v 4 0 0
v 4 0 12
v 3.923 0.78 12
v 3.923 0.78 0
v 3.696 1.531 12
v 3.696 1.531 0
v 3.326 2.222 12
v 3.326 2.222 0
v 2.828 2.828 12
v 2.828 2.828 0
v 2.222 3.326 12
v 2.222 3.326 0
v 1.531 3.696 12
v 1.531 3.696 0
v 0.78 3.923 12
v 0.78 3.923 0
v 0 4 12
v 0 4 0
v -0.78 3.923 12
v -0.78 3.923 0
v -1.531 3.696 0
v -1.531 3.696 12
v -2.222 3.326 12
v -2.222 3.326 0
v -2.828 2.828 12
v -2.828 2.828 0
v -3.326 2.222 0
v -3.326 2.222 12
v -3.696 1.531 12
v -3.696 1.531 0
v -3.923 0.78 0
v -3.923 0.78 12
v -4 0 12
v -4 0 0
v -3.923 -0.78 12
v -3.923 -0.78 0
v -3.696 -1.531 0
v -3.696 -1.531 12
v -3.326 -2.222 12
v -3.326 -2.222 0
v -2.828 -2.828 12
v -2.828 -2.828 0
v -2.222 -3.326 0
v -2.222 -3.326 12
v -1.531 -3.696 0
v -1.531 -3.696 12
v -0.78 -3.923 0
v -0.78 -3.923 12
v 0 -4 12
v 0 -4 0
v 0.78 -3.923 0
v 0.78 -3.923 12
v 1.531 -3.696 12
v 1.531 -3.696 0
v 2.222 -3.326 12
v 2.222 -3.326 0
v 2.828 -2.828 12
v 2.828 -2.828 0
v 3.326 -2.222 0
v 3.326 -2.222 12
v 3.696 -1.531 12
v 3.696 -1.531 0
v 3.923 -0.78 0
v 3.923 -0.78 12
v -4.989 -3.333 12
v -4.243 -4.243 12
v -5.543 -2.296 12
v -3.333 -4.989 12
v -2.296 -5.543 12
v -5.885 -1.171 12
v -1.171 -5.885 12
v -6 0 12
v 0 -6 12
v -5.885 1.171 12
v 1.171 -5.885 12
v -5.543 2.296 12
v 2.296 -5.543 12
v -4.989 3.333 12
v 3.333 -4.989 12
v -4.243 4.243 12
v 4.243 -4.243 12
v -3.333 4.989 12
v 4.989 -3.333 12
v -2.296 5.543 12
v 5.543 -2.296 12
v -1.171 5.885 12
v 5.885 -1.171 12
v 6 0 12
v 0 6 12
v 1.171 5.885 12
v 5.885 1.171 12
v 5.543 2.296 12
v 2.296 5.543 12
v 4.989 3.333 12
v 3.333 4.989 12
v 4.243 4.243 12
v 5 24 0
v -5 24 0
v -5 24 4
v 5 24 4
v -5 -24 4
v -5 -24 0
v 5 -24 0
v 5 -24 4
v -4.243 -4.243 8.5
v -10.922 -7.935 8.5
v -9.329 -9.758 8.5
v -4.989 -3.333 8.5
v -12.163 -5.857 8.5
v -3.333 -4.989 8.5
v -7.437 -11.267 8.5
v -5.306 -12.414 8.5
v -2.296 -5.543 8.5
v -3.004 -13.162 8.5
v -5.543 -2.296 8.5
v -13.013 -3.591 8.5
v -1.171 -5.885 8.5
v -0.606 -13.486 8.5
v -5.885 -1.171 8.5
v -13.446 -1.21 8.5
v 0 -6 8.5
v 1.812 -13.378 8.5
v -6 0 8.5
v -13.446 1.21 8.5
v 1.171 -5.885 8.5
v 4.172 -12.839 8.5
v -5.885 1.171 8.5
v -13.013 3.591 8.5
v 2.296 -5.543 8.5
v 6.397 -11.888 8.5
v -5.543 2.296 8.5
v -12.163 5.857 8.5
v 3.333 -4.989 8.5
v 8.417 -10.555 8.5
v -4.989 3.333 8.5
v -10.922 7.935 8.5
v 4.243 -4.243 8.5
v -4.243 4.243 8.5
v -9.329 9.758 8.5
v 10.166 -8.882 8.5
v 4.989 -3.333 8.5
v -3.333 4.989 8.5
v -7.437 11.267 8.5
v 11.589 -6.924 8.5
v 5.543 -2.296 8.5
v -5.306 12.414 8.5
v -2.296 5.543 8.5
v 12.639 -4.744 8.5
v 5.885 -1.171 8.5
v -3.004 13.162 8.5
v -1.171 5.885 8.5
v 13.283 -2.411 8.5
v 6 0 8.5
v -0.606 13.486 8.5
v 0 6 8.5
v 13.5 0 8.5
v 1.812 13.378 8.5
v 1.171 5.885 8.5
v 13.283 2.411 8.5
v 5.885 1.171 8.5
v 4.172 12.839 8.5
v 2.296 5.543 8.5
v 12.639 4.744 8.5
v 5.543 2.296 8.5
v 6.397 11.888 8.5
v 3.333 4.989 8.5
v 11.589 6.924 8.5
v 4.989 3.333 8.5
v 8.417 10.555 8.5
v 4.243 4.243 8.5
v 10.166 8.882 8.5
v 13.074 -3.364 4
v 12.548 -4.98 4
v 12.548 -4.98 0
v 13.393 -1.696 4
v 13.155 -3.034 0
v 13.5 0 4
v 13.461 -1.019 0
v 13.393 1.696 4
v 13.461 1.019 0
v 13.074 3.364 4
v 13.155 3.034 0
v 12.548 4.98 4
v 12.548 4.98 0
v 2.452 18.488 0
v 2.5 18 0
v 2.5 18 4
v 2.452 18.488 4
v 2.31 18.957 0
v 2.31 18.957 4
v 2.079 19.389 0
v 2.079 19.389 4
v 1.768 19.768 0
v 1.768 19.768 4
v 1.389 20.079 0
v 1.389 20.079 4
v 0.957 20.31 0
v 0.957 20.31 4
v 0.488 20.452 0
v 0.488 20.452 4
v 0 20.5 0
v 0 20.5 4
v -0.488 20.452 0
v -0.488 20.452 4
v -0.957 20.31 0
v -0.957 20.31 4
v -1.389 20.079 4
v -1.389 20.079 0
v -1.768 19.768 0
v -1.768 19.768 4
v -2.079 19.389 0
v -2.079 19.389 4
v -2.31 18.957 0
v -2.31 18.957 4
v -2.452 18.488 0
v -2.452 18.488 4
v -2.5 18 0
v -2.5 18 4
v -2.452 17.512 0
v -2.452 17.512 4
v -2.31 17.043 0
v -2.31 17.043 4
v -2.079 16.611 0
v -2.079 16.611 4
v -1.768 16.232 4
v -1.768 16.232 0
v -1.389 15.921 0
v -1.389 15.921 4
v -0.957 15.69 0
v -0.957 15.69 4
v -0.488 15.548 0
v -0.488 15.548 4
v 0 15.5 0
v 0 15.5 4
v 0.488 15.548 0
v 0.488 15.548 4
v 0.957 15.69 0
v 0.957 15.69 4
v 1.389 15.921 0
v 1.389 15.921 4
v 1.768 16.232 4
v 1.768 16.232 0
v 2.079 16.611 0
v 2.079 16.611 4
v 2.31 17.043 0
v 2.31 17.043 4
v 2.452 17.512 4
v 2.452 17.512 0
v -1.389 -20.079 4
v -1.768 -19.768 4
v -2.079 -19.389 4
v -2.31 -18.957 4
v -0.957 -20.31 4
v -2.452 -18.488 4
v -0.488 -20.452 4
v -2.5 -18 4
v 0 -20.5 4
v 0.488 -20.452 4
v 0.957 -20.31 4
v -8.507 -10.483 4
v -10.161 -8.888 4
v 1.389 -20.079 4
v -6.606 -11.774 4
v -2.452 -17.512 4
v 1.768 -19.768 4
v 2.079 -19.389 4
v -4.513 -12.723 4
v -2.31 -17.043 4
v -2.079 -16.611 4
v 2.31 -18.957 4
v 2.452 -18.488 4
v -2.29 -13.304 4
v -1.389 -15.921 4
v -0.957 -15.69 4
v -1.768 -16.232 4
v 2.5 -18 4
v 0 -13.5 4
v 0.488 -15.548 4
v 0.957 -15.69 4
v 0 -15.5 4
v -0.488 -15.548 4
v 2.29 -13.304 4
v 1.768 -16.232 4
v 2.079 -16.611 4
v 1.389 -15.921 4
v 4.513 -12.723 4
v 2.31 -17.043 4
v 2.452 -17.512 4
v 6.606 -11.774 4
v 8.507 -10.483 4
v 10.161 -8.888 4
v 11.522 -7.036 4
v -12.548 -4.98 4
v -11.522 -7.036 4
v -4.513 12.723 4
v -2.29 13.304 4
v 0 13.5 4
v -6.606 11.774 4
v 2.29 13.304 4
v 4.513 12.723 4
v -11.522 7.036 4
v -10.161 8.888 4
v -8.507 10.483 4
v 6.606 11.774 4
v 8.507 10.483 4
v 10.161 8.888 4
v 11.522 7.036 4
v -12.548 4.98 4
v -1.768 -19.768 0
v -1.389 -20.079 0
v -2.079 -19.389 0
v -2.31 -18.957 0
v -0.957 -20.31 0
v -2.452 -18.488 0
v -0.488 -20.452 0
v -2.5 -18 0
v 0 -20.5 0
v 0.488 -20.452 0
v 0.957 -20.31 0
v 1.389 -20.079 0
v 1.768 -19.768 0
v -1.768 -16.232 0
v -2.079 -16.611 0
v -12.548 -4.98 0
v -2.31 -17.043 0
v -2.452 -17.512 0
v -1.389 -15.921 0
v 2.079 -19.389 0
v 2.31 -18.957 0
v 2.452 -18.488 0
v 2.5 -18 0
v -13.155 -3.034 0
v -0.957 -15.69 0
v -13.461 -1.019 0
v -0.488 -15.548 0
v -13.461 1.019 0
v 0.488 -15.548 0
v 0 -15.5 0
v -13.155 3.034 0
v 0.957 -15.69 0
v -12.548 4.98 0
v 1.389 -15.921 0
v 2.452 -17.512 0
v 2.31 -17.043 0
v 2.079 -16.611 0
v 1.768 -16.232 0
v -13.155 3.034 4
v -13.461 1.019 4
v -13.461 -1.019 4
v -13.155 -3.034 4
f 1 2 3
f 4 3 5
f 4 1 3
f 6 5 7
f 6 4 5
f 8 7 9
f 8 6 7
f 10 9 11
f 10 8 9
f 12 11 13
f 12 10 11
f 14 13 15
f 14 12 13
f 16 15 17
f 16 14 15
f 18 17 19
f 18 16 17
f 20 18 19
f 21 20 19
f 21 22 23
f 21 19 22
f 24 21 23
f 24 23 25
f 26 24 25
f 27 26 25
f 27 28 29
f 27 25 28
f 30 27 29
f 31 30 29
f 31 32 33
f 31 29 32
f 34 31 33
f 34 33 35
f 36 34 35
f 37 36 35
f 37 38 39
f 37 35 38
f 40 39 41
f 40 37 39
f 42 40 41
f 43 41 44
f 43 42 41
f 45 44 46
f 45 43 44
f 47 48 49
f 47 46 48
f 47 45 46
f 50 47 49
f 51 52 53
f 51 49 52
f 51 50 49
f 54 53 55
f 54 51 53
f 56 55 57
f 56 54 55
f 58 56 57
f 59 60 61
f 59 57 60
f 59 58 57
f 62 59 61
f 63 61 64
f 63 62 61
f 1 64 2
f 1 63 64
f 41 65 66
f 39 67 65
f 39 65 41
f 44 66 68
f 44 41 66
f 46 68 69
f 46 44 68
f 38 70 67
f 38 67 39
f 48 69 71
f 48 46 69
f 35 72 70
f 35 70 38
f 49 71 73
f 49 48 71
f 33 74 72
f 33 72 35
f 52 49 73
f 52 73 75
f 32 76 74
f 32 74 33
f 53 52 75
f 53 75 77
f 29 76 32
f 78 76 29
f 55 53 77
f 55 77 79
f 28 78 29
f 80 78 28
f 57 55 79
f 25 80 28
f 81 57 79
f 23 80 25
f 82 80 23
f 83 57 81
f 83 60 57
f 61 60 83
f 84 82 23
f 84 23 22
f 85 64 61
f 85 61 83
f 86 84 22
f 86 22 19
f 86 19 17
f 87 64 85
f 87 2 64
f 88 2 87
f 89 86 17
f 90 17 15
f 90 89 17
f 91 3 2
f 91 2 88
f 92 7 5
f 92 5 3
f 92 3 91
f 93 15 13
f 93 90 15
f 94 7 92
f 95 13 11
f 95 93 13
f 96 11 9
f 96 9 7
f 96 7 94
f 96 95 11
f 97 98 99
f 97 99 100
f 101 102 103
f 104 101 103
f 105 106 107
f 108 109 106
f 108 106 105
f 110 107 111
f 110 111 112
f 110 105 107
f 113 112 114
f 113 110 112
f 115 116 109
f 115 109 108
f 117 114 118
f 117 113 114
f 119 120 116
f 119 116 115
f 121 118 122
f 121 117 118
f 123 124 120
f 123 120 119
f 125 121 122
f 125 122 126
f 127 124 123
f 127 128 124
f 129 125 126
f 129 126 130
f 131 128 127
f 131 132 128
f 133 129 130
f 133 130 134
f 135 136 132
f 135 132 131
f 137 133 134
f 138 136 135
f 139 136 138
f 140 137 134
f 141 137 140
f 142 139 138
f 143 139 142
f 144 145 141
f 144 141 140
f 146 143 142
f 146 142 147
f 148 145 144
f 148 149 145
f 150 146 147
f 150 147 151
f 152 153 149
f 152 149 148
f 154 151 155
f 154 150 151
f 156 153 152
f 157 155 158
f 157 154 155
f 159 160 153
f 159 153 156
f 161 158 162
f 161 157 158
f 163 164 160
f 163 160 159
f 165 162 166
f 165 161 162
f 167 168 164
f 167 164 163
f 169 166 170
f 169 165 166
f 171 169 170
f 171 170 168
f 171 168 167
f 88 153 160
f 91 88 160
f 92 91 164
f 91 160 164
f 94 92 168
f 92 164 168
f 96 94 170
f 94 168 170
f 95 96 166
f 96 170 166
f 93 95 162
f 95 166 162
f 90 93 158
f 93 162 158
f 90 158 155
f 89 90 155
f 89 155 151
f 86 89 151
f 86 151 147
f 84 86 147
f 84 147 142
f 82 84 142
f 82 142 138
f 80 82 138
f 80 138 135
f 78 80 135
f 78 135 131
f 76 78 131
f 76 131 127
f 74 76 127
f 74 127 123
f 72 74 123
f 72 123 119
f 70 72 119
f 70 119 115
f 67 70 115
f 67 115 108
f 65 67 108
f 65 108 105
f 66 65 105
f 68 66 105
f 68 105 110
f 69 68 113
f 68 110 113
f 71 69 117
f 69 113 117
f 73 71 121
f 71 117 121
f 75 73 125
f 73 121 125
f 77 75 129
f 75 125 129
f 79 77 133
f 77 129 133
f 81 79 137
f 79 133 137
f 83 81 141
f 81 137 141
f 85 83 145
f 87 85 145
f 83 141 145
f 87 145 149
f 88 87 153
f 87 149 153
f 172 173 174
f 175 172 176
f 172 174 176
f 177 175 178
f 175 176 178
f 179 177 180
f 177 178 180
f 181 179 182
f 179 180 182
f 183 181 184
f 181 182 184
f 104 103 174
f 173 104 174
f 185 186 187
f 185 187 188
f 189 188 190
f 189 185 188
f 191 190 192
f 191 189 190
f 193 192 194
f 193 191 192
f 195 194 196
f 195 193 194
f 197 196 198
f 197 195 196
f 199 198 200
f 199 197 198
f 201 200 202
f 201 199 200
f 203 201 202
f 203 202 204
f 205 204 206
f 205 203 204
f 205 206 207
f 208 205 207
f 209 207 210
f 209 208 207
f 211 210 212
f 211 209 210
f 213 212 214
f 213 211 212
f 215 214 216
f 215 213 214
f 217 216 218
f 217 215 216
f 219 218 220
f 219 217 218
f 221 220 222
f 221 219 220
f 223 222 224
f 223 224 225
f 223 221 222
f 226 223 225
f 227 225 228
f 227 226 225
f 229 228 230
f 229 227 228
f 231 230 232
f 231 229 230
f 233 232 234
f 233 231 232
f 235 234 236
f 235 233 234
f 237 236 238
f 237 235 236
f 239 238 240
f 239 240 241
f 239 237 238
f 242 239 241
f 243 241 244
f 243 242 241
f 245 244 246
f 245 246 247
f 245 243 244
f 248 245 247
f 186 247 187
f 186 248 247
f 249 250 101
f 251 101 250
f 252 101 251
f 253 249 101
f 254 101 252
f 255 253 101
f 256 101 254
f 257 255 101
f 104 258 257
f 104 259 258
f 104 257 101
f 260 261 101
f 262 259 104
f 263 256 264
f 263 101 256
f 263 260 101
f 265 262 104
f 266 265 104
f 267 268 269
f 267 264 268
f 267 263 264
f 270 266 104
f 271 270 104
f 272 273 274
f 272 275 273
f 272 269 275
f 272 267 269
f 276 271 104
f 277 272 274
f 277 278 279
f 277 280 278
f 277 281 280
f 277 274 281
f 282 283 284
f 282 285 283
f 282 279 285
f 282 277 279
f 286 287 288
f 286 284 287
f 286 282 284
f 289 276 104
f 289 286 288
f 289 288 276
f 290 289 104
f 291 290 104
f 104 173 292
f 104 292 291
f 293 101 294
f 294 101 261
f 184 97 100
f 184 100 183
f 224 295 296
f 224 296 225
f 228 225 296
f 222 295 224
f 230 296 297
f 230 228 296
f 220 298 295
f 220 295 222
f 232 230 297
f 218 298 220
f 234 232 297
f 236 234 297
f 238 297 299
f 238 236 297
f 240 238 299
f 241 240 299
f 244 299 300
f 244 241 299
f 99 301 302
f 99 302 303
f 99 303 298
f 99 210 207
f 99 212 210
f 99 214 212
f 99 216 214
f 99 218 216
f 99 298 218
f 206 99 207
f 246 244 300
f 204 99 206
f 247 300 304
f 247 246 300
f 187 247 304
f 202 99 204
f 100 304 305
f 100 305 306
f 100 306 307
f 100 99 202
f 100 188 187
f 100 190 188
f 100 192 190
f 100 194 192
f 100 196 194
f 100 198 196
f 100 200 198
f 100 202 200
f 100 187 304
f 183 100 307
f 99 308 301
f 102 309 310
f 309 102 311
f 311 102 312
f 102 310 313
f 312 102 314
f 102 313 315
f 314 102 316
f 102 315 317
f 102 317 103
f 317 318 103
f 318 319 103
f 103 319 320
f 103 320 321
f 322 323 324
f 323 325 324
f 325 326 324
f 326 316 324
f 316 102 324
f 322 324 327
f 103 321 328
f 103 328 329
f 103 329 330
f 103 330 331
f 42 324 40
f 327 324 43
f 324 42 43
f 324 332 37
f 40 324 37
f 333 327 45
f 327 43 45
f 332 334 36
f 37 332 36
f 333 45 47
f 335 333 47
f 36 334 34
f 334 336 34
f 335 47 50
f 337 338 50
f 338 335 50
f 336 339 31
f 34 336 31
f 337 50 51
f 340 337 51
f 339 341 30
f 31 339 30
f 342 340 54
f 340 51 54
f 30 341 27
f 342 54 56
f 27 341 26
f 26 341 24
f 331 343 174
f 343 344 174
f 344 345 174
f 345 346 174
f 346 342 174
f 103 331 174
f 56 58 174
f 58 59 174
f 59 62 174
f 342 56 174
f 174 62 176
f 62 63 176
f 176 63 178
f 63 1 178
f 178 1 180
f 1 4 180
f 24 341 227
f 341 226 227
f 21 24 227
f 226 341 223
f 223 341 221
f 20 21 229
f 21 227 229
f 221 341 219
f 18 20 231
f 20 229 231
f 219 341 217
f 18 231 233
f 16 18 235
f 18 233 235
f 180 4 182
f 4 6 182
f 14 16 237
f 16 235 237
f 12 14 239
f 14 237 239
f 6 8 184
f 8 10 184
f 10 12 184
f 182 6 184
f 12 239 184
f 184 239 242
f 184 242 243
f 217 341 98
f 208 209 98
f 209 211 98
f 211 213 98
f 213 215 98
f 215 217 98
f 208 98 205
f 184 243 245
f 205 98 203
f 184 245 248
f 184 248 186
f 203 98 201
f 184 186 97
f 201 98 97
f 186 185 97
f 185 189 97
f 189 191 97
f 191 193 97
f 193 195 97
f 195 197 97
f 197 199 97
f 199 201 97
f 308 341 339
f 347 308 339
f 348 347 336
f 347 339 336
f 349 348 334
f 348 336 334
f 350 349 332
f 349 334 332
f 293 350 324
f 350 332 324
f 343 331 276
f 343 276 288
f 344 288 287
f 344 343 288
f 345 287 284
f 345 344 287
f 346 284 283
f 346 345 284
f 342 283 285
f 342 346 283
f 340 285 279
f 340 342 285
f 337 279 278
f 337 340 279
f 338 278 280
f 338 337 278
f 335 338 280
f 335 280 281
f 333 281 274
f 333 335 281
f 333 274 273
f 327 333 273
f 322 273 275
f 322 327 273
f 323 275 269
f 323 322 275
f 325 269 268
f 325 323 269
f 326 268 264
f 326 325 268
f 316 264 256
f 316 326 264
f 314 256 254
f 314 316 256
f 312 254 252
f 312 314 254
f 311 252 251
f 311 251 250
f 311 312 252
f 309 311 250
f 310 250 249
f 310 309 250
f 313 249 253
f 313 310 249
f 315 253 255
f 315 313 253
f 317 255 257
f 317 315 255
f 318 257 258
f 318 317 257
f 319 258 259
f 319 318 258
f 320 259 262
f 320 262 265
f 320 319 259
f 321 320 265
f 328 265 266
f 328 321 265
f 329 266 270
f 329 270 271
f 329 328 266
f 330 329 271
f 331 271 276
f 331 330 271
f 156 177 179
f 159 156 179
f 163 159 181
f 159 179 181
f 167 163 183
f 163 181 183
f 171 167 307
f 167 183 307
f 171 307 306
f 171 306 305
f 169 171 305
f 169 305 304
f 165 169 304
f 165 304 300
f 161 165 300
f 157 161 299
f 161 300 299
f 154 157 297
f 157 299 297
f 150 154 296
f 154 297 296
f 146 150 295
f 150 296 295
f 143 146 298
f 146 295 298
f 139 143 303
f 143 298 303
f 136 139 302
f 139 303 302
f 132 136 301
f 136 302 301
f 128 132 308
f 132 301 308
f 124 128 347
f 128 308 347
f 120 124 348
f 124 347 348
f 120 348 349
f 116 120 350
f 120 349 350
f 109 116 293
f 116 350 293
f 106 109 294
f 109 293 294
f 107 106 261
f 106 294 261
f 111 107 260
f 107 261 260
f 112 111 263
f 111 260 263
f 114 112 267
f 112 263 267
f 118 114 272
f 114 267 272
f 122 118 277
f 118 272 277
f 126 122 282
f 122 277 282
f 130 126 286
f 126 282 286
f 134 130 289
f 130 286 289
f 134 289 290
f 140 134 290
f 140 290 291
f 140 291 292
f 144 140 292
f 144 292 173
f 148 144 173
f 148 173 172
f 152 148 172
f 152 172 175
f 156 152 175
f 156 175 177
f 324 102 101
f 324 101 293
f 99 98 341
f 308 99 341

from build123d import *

# Parameters (mm, degrees)
SKETCH_R          = 6
PAD_DEPTH         = 12
SKETCH001_R       = 2.5
PAD001_DEPTH      = 4
SKETCH002_R       = 13.5
PAD002_DEPTH      = 8.5
SKETCH003_R       = 4
POCKET_DEPTH      = 0.001
POCKET_DEPTH_BACK = 12.001


with BuildPart() as part:
    # Sketch → Pad (new body)
    with BuildSketch(Plane.XY):
        Circle(SKETCH_R)
    extrude(amount=PAD_DEPTH)

    # Sketch001 → Pad001 (join)
    with BuildSketch(Plane.XY):
        with BuildLine():
            ThreePointArc((12.548063, -4.97957), (13.5, 0), (12.548063, 4.97957))
            Line((5, 24), (12.548063, 4.97957))
            Line((-5, 24), (5, 24))
            Line((-5, 24), (-12.548063, 4.97957))
            ThreePointArc((-12.548063, 4.97957), (-13.5, -1.3e-05), (-12.548053, -4.979595))
            Line((-5, -24), (-12.548053, -4.979595))
            Line((-5, -24), (5, -24))
            Line((5, -24), (12.548063, -4.97957))
        make_face()
        with Locations((0, 18)):
            Circle(SKETCH001_R, mode=Mode.SUBTRACT)
        with Locations((0, -18)):
            Circle(SKETCH001_R, mode=Mode.SUBTRACT)
    extrude(amount=PAD001_DEPTH)

    # Sketch002 → Pad002 (join)
    with BuildSketch(Plane.XY):
        Circle(SKETCH002_R)
    extrude(amount=PAD002_DEPTH)

    # Sketch003 → Pocket (cut, two sides)
    with BuildSketch(Plane.XY) as pocket_sk:
        Circle(SKETCH003_R)
    extrude(amount=-POCKET_DEPTH, mode=Mode.SUBTRACT)
    extrude(pocket_sk.sketch, amount=POCKET_DEPTH_BACK, mode=Mode.SUBTRACT)


solid = part.part
